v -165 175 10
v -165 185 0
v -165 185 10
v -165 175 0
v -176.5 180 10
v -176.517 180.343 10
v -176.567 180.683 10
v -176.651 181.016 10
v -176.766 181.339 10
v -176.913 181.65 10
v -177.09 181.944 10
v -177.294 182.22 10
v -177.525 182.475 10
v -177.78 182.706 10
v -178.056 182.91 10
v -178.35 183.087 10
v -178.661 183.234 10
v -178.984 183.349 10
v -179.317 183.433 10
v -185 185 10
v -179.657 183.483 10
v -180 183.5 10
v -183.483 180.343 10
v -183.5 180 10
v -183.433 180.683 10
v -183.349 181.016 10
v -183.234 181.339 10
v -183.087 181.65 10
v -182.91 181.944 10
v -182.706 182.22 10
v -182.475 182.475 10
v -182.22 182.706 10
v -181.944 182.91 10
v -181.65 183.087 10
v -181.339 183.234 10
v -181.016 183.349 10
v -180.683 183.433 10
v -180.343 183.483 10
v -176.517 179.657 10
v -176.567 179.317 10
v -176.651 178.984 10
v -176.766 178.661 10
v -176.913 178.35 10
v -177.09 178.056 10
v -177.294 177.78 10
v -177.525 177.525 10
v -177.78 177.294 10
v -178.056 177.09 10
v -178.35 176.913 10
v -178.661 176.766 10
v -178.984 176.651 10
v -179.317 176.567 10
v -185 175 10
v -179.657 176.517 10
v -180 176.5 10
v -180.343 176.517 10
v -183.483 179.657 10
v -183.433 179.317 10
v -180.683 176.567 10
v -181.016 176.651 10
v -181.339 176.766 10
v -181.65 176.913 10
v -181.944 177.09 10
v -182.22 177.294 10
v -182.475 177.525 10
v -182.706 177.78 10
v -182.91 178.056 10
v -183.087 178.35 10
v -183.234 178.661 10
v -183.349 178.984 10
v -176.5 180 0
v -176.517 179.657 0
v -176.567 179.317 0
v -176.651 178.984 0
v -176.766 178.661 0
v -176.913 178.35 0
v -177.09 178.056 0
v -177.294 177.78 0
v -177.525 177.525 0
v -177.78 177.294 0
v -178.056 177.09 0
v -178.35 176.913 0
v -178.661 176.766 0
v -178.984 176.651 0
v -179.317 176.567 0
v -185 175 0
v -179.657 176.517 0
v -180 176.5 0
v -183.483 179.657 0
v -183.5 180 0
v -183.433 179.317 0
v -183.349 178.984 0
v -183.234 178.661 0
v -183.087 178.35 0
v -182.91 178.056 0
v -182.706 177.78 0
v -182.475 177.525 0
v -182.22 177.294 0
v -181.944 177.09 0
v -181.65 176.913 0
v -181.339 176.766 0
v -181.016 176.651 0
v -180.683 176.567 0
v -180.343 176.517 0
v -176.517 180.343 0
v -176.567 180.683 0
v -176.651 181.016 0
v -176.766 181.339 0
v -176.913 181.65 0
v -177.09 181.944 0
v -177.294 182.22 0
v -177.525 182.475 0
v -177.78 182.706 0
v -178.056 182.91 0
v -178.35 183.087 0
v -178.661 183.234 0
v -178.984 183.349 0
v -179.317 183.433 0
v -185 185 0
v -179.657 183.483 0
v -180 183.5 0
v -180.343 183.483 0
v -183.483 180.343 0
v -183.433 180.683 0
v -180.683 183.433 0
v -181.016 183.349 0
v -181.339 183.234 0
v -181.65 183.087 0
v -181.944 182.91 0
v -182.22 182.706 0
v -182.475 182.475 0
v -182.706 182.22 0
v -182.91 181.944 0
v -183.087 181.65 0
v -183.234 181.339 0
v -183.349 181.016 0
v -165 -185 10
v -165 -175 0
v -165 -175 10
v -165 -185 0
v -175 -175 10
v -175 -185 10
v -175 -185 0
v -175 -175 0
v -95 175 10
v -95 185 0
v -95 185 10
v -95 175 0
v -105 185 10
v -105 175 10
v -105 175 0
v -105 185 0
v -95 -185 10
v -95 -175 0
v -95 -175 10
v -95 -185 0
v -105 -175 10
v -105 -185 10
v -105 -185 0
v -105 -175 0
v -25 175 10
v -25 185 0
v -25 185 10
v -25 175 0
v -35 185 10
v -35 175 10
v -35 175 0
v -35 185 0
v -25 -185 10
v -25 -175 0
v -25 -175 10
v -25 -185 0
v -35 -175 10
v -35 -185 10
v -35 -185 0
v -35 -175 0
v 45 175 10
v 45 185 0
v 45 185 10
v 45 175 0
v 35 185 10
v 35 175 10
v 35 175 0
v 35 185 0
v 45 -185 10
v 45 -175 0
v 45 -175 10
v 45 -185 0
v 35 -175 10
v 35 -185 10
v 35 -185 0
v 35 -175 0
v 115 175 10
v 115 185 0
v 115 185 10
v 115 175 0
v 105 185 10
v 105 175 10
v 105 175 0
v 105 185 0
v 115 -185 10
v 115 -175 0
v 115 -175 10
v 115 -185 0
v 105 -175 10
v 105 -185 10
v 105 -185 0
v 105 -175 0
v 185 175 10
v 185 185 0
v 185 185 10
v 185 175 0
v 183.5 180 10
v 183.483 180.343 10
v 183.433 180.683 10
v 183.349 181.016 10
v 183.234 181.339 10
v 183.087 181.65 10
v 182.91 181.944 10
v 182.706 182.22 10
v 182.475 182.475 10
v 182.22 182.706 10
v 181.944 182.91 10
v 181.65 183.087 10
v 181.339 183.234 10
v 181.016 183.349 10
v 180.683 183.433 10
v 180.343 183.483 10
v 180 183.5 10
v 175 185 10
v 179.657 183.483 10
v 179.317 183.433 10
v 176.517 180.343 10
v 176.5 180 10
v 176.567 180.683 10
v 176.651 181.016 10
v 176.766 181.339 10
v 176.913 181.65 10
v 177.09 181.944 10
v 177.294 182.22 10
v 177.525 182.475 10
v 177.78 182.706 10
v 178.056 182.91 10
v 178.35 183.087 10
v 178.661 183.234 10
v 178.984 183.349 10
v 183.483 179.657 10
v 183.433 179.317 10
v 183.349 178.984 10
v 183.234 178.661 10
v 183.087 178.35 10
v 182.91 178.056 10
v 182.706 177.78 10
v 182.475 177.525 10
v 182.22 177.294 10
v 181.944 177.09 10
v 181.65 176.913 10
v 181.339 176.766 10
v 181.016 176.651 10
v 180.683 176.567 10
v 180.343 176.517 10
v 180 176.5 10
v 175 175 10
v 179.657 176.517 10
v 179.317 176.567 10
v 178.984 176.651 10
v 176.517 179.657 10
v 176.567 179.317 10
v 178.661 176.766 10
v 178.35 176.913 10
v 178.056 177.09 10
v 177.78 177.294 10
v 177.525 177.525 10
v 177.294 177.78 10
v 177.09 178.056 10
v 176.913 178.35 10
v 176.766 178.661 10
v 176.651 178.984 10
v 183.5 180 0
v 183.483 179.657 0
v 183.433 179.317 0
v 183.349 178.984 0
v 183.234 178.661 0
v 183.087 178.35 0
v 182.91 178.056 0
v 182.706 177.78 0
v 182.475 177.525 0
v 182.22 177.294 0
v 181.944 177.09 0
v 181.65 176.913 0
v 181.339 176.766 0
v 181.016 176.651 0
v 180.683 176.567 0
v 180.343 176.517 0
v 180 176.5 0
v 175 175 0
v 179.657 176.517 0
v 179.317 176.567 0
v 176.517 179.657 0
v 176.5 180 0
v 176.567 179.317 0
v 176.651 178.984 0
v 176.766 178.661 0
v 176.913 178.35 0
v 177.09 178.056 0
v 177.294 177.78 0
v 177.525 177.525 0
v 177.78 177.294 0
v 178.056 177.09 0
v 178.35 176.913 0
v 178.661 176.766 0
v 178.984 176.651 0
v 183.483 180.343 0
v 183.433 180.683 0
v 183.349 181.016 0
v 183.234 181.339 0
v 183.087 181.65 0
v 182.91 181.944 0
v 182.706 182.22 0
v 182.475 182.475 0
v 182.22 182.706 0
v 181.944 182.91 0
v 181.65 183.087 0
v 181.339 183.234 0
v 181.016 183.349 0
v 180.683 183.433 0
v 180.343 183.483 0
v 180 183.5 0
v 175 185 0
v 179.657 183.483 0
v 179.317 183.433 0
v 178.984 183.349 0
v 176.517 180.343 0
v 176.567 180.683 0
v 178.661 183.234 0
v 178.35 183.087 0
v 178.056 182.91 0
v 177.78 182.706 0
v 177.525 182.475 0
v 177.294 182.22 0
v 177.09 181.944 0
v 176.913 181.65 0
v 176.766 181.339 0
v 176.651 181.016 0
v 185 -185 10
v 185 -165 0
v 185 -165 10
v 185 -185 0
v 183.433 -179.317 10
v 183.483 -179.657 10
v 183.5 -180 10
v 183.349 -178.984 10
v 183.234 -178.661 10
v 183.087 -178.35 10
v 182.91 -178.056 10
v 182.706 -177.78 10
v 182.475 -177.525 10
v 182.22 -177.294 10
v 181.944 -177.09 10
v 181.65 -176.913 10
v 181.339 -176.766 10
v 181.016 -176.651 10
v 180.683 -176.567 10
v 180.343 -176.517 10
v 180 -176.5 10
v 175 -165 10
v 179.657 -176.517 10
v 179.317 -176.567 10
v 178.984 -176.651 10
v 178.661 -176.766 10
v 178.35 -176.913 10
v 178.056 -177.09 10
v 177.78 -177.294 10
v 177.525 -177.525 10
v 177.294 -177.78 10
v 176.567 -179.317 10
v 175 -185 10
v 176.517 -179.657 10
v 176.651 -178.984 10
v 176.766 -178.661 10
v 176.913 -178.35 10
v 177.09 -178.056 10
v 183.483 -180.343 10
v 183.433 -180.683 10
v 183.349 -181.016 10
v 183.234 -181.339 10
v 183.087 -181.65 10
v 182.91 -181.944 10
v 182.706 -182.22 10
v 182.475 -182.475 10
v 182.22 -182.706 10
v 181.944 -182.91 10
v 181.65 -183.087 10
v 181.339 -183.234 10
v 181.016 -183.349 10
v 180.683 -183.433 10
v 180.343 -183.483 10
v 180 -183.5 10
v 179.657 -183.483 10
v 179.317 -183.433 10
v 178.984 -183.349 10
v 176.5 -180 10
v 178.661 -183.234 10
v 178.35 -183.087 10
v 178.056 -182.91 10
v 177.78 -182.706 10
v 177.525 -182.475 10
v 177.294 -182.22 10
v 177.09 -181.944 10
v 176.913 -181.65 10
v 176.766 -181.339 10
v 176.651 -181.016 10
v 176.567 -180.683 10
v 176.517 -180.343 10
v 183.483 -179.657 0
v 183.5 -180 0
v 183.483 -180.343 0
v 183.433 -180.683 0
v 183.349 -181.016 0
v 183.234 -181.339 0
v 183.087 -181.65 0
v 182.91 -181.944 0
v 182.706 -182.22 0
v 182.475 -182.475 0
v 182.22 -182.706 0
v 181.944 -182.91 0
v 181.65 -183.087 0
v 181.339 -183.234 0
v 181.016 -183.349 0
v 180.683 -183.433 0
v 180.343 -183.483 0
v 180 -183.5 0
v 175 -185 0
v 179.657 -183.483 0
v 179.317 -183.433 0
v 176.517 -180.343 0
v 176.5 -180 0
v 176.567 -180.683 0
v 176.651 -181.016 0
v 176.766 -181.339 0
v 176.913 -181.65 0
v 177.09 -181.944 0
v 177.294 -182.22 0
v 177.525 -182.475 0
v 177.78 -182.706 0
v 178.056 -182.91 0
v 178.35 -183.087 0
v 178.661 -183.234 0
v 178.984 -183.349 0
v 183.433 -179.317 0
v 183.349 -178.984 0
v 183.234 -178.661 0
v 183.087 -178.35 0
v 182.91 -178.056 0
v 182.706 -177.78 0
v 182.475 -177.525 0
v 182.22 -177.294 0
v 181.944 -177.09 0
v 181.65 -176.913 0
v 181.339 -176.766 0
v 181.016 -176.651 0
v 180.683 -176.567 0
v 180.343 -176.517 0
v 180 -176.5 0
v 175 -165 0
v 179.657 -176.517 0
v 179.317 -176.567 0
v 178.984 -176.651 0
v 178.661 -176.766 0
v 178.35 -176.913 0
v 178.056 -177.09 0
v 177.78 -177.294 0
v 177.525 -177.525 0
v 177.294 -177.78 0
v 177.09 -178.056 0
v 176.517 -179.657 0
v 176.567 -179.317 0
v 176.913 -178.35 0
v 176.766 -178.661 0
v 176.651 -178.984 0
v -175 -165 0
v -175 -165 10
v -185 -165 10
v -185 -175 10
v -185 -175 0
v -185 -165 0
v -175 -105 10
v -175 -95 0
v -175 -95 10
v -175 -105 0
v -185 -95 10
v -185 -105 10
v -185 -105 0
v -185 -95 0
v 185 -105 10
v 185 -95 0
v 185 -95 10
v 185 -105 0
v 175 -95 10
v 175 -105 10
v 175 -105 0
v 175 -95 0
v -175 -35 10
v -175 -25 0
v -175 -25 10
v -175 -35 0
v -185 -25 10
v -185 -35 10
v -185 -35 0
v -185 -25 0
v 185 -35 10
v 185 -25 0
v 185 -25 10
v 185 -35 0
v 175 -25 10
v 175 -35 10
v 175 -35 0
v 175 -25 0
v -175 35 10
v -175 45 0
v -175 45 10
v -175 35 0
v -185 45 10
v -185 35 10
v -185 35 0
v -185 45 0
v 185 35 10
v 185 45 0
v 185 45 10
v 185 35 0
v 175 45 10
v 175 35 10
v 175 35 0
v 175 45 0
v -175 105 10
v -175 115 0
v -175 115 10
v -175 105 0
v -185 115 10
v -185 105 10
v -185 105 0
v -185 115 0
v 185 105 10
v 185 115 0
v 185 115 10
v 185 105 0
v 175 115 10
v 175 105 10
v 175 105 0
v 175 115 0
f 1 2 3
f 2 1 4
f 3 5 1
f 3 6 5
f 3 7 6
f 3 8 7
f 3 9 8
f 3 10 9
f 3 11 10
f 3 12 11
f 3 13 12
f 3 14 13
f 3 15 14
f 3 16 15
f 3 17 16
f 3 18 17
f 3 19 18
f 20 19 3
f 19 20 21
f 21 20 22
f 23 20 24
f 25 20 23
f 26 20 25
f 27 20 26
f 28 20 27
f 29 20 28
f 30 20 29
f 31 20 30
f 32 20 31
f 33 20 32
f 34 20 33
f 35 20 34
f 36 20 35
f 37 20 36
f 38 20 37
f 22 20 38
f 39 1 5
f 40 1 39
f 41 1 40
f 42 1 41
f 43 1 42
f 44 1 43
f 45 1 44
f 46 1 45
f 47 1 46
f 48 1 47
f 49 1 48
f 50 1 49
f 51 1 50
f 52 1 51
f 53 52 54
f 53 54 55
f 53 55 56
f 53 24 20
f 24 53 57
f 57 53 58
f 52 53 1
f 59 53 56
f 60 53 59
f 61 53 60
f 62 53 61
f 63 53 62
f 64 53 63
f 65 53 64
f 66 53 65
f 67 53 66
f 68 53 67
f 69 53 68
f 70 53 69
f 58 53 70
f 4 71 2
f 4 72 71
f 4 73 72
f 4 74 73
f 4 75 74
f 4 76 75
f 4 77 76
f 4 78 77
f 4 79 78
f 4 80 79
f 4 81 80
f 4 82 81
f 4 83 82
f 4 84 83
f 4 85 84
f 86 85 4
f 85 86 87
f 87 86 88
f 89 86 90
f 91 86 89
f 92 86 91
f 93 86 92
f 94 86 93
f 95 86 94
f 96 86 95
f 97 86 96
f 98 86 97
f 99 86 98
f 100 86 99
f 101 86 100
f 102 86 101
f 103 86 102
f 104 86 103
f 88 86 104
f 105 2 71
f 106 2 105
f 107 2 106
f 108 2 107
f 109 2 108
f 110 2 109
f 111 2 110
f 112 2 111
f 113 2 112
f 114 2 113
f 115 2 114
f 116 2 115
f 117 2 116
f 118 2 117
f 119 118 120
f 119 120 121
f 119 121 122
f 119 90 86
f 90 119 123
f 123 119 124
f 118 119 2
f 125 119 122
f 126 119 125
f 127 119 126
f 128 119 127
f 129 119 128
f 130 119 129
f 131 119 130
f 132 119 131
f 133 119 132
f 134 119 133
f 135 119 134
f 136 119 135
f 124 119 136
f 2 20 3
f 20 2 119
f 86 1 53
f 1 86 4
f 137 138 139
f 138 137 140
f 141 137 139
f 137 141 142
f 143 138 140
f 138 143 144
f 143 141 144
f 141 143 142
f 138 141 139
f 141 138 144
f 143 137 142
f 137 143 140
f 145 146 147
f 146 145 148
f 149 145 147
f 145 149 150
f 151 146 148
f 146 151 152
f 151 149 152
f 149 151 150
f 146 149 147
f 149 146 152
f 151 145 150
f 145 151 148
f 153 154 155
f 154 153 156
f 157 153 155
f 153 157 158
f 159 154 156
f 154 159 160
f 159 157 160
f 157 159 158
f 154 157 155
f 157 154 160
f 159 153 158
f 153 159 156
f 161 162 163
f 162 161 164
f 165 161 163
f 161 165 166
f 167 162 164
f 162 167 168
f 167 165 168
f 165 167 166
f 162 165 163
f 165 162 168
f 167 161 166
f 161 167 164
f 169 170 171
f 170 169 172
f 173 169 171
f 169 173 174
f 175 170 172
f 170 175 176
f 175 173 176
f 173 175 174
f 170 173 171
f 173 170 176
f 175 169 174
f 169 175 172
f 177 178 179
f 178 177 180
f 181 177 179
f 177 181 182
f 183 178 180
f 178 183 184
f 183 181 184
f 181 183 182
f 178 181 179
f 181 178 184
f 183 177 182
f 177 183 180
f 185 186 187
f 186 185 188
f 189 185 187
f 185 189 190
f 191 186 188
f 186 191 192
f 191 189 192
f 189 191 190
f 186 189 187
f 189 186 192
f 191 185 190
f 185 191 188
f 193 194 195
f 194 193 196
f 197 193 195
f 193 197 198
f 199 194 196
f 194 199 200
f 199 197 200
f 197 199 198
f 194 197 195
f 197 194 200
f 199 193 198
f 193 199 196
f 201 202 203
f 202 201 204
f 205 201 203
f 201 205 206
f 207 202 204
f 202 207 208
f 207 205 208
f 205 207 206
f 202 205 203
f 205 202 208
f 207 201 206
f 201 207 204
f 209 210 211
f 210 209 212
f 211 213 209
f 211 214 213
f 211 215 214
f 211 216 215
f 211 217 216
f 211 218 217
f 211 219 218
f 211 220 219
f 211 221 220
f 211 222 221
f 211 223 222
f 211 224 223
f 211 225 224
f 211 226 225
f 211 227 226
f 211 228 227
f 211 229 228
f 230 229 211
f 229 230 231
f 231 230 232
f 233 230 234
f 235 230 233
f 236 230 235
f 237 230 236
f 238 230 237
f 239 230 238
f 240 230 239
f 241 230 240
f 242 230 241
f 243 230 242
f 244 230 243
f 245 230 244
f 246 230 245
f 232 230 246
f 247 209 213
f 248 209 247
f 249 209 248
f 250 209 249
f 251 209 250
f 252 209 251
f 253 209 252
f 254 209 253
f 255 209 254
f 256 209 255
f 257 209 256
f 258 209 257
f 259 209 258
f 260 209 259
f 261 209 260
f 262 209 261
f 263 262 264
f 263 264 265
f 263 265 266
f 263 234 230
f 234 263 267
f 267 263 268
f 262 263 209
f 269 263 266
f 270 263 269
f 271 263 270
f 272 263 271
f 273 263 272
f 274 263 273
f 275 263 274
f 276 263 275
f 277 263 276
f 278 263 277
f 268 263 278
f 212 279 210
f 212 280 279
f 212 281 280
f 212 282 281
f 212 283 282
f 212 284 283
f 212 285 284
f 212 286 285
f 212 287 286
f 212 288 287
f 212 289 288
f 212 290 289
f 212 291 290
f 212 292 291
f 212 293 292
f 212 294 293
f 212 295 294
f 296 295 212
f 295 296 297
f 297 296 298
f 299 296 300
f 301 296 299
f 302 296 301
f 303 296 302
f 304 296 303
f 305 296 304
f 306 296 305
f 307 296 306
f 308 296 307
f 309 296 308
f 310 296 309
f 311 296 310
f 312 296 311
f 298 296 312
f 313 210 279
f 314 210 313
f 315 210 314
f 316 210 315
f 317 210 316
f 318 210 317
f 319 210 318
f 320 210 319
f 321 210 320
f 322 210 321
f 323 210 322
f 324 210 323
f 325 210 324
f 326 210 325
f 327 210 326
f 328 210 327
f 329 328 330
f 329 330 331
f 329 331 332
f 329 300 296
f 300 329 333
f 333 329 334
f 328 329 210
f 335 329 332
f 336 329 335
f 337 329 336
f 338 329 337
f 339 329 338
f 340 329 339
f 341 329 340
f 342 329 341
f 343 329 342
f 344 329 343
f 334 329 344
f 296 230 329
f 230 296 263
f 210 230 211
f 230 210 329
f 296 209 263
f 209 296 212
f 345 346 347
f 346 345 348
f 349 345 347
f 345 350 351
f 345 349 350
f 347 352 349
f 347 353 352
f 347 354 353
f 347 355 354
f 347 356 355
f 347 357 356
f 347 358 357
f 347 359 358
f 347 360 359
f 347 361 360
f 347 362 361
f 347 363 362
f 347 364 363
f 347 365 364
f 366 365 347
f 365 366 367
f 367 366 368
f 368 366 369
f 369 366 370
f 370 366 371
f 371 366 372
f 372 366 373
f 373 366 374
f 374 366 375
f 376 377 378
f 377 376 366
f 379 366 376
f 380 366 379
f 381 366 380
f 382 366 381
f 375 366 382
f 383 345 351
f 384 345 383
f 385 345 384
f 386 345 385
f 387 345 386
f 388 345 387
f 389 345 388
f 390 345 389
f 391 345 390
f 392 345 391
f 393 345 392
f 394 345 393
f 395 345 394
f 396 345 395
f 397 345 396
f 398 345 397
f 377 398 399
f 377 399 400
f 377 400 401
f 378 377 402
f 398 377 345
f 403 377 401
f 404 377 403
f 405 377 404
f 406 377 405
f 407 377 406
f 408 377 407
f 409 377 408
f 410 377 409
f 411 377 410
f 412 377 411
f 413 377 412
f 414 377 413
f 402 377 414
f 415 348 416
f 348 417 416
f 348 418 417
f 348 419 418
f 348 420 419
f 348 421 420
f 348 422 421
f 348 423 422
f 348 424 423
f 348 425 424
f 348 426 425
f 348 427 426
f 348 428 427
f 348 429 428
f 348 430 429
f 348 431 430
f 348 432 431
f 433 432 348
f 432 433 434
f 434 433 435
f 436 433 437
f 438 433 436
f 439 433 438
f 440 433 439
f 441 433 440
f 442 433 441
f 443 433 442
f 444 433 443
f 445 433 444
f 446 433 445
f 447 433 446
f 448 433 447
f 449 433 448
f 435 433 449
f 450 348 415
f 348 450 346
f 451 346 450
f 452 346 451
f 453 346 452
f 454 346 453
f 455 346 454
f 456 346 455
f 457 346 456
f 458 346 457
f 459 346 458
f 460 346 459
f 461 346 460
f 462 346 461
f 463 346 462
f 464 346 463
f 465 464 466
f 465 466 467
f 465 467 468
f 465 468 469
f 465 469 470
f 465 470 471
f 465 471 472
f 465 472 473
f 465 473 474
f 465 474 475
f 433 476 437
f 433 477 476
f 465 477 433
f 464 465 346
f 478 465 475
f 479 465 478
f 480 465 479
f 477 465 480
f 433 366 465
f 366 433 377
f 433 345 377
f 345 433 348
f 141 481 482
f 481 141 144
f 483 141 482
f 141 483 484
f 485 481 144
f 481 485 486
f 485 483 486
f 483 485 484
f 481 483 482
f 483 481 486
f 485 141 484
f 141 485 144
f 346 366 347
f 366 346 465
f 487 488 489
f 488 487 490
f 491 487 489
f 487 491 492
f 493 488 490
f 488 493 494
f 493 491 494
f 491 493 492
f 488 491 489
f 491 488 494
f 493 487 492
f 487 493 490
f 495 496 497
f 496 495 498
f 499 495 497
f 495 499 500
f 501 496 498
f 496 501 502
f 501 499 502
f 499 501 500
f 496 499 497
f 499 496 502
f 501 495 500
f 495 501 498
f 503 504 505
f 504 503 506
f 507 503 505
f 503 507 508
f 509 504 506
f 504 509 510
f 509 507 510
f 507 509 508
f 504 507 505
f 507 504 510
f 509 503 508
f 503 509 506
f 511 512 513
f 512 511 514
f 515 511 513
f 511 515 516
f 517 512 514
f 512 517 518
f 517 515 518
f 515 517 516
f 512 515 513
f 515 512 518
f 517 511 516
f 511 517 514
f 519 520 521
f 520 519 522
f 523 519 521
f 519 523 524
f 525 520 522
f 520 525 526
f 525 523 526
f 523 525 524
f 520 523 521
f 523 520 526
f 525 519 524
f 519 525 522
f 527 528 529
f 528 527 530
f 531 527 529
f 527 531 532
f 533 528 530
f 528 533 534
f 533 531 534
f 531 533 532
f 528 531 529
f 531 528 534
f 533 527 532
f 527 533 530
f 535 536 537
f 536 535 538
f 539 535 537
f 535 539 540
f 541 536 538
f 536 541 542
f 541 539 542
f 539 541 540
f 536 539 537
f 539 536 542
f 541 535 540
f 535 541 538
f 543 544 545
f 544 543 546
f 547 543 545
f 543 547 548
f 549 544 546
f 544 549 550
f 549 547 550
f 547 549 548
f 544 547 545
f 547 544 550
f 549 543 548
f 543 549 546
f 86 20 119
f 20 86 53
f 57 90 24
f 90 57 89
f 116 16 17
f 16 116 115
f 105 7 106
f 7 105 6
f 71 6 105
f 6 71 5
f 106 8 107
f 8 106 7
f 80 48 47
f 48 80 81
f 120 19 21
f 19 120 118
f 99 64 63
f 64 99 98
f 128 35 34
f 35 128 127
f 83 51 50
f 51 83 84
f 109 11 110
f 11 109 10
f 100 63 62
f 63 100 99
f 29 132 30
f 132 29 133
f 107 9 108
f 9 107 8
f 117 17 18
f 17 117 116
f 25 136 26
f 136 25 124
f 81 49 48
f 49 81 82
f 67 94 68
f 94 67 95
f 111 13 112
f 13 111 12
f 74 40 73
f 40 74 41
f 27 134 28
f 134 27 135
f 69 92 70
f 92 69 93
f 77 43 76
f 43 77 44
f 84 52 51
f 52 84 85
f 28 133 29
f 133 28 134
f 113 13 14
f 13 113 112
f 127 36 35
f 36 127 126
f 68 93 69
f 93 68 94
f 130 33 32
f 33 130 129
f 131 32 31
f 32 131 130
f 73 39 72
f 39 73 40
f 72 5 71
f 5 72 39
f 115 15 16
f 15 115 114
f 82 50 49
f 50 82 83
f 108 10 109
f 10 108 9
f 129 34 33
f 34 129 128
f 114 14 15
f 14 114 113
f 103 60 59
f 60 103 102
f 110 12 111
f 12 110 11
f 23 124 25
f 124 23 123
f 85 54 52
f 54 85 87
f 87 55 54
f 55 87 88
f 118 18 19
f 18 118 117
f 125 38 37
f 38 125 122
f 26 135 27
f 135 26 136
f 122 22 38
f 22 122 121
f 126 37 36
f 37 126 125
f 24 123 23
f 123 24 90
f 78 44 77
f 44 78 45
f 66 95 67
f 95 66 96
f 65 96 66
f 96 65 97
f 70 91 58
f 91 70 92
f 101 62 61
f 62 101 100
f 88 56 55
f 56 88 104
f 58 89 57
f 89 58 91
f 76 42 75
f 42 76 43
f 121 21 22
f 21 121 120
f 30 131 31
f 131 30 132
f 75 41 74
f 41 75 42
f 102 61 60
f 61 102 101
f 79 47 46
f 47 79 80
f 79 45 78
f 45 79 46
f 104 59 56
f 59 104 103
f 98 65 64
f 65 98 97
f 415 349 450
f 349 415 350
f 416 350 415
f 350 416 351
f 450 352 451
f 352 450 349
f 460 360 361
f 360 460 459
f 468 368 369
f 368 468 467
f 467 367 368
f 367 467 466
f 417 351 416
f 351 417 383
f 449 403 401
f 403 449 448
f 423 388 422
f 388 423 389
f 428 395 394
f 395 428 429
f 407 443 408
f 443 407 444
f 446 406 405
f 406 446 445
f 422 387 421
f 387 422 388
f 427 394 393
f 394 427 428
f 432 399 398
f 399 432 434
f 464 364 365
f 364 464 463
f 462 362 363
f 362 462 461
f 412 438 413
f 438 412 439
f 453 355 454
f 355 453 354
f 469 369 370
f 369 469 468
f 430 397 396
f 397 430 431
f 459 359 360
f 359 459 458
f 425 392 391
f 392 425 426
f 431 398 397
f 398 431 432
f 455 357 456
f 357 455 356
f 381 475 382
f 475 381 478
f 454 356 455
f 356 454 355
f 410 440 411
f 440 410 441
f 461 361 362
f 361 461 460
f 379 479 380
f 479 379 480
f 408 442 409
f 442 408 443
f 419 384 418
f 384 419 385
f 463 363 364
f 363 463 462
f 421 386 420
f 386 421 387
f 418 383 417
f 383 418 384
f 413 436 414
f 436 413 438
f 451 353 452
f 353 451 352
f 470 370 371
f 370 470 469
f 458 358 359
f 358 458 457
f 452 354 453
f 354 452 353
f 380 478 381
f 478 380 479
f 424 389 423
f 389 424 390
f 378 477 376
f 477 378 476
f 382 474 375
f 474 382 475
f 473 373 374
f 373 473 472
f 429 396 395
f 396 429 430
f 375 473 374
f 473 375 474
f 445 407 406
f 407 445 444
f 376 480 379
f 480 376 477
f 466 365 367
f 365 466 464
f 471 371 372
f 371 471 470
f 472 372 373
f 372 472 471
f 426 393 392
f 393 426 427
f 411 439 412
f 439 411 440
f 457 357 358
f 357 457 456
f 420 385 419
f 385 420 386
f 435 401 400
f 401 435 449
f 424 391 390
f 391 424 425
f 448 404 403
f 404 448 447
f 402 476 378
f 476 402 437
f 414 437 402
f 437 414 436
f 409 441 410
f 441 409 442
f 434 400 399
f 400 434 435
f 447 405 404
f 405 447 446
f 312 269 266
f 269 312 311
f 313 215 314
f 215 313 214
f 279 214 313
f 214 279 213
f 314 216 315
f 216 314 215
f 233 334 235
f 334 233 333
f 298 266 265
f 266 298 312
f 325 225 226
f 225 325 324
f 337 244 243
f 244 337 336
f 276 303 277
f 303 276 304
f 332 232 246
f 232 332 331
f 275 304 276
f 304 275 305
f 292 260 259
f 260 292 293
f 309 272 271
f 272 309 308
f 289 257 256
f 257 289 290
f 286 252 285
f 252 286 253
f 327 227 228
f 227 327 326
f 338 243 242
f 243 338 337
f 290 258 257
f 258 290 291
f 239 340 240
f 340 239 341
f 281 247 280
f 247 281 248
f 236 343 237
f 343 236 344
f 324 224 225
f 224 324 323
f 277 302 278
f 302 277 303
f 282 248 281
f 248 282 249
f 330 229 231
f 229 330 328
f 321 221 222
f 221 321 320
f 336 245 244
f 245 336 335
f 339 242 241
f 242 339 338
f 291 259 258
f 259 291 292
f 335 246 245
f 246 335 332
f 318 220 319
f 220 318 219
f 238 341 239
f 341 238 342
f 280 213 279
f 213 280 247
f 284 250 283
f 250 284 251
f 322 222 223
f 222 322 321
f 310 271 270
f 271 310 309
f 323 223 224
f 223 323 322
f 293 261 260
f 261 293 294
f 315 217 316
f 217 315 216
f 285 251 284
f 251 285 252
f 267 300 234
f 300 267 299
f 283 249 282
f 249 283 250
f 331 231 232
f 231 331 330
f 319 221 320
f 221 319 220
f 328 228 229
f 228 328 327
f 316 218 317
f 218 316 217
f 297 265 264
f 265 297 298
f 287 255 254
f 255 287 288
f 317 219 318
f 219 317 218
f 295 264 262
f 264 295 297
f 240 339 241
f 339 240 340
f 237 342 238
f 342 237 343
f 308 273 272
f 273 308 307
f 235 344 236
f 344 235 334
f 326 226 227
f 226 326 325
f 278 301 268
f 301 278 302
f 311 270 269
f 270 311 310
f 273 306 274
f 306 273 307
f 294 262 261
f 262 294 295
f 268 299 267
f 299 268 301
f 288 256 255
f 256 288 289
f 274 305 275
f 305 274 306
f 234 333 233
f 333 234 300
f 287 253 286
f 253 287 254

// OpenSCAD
// ring_17.scad - ring index 17 (z bottom = 170 mm)
$fn = 64; bar = 10; half_b = bar/2; outer = 370; half_outer = outer/2;
front_y = 180; back_y = -180; left_x = -180; right_x = 180;
x_centers = [-170, -100, -30, 40, 110, 180];
z_centers = [5, 85, 155, 225, 295, 365, 435, 505, 575, 645, 715]; ring_z = 170;
module place_box(cx, cy, sx, sy) { translate([cx - sx/2, cy - sy/2, 0]) cube([sx, sy, bar]); }

difference() { union() {
    for (x = x_centers) { place_box(x, front_y, bar, bar); place_box(x, back_y, bar, bar); }
    for (y = x_centers) { place_box(left_x, y, bar, bar); place_box(right_x, y, bar, bar); }
    for (zc = z_centers) if ((zc - half_b < ring_z + bar) && (zc + half_b > ring_z)) {
        translate([-half_outer, front_y - half_b, 0]) cube([outer, bar, bar]);
        translate([-half_outer, back_y - half_b, 0])  cube([outer, bar, bar]);
        translate([left_x - half_b, -half_outer, 0])  cube([bar, outer, bar]);
        translate([right_x - half_b, -half_outer, 0]) cube([bar, outer, bar]);
    }
  }
  for (cx = [-180, 180]) for (cy = [-180, 180]) translate([cx, cy, 0]) cylinder(h = bar, r = 3.5, $fn = 64);
}
